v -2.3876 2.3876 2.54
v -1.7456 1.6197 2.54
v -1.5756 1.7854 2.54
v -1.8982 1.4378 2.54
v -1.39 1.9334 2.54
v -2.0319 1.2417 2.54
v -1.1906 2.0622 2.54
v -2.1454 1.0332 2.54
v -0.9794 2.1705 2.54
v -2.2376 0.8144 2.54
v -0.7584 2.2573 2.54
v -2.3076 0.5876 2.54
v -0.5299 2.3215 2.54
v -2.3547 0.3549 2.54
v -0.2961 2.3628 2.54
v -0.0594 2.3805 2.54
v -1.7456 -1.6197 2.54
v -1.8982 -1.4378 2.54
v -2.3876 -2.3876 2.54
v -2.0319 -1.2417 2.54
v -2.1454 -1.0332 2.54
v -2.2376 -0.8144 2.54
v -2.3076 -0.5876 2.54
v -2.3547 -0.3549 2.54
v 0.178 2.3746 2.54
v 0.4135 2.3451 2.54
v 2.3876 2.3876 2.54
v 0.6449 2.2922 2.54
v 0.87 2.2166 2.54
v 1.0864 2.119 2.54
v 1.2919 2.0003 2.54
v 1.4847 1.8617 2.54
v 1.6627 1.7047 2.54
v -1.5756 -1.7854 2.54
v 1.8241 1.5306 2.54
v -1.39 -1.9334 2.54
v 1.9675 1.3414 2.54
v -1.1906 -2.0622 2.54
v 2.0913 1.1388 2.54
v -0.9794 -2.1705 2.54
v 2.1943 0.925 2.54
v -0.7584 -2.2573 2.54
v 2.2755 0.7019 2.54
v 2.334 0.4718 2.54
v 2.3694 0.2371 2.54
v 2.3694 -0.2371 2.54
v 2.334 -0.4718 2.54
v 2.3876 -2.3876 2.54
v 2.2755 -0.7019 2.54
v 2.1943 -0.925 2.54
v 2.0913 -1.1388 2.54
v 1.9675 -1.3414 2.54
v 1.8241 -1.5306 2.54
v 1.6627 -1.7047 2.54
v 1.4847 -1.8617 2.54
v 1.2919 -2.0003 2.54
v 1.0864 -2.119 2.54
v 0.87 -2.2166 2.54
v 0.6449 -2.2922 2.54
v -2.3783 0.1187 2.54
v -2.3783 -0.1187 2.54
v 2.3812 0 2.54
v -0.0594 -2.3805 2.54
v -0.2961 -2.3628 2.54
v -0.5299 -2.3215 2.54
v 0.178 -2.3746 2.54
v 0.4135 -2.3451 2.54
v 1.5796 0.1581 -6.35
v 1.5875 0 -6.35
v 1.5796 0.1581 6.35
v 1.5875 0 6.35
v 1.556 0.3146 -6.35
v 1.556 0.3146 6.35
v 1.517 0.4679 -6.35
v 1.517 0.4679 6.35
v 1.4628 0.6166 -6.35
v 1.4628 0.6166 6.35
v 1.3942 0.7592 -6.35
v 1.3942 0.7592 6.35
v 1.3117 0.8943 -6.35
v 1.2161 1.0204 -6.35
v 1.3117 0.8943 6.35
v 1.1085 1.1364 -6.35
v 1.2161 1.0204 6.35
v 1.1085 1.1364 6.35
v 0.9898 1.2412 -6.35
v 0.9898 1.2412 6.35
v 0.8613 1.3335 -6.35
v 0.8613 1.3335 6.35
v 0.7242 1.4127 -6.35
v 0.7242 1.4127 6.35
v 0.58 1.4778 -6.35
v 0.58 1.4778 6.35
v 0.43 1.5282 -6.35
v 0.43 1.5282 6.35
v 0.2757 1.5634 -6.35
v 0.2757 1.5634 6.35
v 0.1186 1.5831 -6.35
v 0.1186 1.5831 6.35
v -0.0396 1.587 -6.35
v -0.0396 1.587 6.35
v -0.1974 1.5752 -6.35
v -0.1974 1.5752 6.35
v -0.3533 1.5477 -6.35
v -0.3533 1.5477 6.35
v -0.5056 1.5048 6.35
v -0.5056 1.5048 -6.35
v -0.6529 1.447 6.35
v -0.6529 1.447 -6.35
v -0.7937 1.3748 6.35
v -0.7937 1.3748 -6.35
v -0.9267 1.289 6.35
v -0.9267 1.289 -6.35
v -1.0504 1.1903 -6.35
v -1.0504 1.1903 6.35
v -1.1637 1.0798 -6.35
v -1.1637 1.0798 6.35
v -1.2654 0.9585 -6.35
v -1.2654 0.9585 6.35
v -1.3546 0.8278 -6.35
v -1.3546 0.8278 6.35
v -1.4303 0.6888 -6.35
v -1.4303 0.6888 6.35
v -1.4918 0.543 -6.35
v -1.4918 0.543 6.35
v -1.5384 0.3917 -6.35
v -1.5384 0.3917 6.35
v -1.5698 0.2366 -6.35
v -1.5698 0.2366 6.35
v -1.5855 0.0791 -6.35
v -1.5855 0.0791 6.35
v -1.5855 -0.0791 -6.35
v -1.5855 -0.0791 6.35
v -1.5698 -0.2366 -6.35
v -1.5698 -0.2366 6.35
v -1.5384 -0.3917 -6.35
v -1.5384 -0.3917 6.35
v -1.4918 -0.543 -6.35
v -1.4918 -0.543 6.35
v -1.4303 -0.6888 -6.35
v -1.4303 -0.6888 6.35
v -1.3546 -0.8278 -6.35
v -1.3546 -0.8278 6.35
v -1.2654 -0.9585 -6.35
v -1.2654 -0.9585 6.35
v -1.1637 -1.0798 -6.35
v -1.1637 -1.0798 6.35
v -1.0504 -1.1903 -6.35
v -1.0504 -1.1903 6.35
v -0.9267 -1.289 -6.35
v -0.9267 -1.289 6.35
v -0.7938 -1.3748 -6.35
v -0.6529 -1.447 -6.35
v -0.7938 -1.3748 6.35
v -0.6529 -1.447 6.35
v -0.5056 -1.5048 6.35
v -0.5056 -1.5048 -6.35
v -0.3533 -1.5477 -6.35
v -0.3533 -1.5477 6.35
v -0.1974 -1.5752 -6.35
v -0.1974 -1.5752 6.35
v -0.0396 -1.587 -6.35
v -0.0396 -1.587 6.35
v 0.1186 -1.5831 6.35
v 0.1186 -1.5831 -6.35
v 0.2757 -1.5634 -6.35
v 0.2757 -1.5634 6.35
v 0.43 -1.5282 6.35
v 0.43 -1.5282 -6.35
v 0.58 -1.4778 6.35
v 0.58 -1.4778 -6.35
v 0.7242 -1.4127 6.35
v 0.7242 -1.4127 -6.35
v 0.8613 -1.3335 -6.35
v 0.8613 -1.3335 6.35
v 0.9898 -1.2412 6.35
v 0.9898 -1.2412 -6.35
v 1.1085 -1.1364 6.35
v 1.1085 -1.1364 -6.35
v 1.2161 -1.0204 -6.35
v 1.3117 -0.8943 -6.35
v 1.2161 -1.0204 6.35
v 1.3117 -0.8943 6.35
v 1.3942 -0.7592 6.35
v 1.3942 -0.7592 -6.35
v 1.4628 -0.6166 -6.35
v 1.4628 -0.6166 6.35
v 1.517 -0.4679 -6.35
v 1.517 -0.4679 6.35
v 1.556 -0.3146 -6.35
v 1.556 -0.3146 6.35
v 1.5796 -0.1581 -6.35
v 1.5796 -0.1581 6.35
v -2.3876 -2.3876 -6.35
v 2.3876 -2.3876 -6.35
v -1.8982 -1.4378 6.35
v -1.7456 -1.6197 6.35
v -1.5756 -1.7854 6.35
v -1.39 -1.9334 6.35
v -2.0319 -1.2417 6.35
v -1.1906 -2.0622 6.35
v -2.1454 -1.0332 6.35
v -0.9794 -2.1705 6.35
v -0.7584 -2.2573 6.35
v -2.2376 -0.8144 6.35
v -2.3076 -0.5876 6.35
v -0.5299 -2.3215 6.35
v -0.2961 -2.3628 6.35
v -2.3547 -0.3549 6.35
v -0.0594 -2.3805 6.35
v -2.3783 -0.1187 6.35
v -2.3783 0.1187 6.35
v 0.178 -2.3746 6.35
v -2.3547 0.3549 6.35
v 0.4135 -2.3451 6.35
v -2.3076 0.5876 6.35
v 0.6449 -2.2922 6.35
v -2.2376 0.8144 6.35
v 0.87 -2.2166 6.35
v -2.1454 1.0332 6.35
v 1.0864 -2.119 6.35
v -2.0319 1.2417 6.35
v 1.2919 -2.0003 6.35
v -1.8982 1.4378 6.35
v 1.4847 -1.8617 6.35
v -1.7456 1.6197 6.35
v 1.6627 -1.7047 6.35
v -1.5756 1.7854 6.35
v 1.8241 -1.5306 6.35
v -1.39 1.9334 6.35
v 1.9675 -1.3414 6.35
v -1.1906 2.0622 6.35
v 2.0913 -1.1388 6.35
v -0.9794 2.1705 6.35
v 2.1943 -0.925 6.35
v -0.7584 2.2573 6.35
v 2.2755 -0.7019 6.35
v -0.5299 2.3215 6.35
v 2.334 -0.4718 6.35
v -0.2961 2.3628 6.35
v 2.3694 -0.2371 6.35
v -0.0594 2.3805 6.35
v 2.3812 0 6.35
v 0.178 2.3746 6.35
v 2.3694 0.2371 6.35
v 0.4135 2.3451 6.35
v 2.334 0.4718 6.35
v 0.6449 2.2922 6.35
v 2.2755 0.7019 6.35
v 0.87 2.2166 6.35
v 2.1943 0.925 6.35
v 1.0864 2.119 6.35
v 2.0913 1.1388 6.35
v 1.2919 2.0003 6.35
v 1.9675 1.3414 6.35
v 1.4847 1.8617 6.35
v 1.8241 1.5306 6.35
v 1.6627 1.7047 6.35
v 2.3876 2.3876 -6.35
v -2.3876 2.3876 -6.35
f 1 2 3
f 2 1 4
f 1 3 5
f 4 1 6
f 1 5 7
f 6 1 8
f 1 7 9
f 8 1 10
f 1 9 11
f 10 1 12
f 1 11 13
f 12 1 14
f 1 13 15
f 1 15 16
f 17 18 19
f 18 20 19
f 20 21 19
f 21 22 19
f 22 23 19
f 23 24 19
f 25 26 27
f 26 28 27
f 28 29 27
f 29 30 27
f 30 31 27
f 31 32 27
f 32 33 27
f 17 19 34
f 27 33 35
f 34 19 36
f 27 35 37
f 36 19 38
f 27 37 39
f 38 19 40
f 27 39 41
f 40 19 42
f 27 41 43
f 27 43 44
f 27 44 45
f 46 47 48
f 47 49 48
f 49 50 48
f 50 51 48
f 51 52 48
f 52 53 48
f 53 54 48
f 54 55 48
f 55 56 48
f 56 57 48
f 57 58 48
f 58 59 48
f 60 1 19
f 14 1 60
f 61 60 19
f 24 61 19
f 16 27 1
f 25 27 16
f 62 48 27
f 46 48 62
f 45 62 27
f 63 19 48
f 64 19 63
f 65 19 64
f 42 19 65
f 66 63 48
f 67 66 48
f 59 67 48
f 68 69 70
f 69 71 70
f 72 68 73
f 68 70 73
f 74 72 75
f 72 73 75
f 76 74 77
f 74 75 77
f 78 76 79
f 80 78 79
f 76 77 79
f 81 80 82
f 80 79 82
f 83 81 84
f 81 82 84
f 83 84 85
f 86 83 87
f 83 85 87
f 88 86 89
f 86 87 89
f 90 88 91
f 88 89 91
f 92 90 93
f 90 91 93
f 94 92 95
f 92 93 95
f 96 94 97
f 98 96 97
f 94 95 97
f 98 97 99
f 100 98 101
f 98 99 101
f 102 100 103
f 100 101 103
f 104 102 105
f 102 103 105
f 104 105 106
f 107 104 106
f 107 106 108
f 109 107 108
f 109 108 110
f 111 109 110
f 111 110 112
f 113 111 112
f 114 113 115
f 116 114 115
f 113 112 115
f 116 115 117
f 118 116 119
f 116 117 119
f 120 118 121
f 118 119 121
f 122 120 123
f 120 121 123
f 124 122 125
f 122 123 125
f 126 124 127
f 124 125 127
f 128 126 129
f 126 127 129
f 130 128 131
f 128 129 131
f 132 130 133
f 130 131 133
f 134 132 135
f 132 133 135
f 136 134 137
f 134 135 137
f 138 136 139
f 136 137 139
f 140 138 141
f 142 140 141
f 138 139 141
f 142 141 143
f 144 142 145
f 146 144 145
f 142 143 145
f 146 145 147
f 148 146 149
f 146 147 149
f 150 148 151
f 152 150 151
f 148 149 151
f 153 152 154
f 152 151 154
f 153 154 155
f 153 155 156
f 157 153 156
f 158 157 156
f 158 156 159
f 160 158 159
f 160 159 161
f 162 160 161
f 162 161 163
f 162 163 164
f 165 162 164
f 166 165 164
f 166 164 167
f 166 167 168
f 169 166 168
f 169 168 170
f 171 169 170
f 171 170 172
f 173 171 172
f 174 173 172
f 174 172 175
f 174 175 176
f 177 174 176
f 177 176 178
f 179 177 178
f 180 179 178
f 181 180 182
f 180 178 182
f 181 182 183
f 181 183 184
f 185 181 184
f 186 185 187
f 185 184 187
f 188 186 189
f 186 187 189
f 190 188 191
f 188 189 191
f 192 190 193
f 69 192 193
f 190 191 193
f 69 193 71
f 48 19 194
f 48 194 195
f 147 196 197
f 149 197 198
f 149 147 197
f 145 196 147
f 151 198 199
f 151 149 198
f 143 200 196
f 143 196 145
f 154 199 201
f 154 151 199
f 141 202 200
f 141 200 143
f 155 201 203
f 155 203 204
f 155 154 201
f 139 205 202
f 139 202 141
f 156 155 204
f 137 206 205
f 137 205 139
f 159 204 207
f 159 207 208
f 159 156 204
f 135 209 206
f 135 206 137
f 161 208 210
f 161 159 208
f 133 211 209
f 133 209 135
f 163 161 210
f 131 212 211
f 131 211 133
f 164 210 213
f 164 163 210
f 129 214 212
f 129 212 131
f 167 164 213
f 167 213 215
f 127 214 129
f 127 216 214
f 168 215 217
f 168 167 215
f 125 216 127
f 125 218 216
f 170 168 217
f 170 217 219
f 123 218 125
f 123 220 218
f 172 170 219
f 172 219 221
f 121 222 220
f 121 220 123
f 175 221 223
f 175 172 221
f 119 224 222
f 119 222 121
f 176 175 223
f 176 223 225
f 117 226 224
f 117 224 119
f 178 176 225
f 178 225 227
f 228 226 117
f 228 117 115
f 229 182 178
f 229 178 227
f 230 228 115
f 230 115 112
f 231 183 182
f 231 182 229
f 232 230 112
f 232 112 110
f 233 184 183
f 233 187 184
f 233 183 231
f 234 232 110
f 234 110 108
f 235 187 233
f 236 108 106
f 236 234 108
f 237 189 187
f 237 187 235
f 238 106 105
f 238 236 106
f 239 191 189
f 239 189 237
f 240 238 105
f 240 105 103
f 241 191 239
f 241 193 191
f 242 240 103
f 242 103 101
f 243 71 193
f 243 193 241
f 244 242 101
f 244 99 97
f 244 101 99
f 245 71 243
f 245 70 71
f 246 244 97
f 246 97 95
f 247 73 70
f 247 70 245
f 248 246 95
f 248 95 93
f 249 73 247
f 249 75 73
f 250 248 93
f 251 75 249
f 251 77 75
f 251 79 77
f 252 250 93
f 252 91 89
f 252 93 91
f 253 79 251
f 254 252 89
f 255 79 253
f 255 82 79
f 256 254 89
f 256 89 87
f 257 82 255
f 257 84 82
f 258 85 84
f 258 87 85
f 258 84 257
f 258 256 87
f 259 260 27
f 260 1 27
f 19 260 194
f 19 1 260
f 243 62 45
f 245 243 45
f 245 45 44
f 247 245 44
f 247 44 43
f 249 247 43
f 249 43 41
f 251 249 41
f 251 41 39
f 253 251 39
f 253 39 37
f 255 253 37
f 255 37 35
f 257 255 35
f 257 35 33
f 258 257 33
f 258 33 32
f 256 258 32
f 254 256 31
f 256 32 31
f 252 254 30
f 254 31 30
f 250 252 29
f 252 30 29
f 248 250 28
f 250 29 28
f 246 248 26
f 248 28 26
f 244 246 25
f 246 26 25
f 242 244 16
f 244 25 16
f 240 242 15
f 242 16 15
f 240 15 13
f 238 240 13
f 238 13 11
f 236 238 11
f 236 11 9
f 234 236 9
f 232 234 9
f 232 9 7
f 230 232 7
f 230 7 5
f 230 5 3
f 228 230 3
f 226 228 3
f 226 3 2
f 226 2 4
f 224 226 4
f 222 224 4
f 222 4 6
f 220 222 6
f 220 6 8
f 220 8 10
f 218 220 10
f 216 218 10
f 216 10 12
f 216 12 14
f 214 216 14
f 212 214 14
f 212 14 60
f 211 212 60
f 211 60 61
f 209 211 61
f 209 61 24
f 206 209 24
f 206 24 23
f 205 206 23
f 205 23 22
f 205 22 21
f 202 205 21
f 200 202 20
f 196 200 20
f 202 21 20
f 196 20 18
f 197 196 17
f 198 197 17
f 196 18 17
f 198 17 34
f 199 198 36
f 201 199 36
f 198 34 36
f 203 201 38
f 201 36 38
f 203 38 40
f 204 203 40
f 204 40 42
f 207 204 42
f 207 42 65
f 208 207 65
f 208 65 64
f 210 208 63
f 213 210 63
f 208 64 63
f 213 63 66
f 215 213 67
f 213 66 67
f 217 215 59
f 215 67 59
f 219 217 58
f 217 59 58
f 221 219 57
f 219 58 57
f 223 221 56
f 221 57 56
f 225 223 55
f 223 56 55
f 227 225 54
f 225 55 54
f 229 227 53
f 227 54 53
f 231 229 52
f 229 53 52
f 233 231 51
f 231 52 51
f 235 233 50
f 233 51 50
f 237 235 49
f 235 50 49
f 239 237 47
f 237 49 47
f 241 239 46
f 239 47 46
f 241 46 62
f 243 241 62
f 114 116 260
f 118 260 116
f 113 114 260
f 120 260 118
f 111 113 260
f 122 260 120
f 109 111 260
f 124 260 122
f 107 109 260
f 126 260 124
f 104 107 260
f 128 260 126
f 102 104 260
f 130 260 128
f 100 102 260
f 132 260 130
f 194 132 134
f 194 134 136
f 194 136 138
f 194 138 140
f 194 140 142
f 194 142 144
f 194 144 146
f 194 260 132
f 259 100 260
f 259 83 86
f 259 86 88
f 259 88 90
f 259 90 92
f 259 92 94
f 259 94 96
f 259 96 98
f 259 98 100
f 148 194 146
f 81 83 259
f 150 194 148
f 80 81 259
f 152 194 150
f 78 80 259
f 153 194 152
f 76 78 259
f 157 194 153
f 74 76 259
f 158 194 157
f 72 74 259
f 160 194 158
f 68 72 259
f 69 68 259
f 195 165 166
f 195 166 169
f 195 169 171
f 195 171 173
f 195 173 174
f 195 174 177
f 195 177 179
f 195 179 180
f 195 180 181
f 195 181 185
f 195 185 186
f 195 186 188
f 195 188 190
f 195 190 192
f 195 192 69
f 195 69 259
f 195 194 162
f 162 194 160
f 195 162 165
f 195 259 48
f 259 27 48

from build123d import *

# Parameters (mm, degrees)
F0_R     = 2.38125
F1_DEPTH = 6.35
F2_R     = 1.5875
F3_DEPTH = 6.35
F4_W     = 4.7752
F4_H     = 4.7752
F4_R     = 2.38125
F5_DEPTH = 2.54
F6_DEPTH = 6.35


with BuildPart() as f1:
    # F0 (on Top) → F1 (new body)
    with BuildSketch(Plane.XY):
        Circle(F0_R)
    extrude(amount=F1_DEPTH)

    # F2 (on face) → F3 (cut)
    with BuildSketch(Plane.XY.offset(6.35)):
        Circle(F2_R)
    extrude(amount=-F3_DEPTH, mode=Mode.SUBTRACT)

    # F4 (on face) → F5 (join)
    with BuildSketch(Plane(origin=(0, 0, 0), x_dir=(1, 0, 0), z_dir=(0, 0, -1))):
        Rectangle(F4_W, F4_H)
        Circle(F4_R, mode=Mode.SUBTRACT)
    extrude(amount=-F5_DEPTH)

    # F6 (add): a face of the model
    f6_faces = [f1.faces().sort_by_distance(p)[0] for p in [
        (-2.320068474, 0, 0),
    ]]
    extrude(f6_faces, amount=F6_DEPTH)


solid = f1.part
